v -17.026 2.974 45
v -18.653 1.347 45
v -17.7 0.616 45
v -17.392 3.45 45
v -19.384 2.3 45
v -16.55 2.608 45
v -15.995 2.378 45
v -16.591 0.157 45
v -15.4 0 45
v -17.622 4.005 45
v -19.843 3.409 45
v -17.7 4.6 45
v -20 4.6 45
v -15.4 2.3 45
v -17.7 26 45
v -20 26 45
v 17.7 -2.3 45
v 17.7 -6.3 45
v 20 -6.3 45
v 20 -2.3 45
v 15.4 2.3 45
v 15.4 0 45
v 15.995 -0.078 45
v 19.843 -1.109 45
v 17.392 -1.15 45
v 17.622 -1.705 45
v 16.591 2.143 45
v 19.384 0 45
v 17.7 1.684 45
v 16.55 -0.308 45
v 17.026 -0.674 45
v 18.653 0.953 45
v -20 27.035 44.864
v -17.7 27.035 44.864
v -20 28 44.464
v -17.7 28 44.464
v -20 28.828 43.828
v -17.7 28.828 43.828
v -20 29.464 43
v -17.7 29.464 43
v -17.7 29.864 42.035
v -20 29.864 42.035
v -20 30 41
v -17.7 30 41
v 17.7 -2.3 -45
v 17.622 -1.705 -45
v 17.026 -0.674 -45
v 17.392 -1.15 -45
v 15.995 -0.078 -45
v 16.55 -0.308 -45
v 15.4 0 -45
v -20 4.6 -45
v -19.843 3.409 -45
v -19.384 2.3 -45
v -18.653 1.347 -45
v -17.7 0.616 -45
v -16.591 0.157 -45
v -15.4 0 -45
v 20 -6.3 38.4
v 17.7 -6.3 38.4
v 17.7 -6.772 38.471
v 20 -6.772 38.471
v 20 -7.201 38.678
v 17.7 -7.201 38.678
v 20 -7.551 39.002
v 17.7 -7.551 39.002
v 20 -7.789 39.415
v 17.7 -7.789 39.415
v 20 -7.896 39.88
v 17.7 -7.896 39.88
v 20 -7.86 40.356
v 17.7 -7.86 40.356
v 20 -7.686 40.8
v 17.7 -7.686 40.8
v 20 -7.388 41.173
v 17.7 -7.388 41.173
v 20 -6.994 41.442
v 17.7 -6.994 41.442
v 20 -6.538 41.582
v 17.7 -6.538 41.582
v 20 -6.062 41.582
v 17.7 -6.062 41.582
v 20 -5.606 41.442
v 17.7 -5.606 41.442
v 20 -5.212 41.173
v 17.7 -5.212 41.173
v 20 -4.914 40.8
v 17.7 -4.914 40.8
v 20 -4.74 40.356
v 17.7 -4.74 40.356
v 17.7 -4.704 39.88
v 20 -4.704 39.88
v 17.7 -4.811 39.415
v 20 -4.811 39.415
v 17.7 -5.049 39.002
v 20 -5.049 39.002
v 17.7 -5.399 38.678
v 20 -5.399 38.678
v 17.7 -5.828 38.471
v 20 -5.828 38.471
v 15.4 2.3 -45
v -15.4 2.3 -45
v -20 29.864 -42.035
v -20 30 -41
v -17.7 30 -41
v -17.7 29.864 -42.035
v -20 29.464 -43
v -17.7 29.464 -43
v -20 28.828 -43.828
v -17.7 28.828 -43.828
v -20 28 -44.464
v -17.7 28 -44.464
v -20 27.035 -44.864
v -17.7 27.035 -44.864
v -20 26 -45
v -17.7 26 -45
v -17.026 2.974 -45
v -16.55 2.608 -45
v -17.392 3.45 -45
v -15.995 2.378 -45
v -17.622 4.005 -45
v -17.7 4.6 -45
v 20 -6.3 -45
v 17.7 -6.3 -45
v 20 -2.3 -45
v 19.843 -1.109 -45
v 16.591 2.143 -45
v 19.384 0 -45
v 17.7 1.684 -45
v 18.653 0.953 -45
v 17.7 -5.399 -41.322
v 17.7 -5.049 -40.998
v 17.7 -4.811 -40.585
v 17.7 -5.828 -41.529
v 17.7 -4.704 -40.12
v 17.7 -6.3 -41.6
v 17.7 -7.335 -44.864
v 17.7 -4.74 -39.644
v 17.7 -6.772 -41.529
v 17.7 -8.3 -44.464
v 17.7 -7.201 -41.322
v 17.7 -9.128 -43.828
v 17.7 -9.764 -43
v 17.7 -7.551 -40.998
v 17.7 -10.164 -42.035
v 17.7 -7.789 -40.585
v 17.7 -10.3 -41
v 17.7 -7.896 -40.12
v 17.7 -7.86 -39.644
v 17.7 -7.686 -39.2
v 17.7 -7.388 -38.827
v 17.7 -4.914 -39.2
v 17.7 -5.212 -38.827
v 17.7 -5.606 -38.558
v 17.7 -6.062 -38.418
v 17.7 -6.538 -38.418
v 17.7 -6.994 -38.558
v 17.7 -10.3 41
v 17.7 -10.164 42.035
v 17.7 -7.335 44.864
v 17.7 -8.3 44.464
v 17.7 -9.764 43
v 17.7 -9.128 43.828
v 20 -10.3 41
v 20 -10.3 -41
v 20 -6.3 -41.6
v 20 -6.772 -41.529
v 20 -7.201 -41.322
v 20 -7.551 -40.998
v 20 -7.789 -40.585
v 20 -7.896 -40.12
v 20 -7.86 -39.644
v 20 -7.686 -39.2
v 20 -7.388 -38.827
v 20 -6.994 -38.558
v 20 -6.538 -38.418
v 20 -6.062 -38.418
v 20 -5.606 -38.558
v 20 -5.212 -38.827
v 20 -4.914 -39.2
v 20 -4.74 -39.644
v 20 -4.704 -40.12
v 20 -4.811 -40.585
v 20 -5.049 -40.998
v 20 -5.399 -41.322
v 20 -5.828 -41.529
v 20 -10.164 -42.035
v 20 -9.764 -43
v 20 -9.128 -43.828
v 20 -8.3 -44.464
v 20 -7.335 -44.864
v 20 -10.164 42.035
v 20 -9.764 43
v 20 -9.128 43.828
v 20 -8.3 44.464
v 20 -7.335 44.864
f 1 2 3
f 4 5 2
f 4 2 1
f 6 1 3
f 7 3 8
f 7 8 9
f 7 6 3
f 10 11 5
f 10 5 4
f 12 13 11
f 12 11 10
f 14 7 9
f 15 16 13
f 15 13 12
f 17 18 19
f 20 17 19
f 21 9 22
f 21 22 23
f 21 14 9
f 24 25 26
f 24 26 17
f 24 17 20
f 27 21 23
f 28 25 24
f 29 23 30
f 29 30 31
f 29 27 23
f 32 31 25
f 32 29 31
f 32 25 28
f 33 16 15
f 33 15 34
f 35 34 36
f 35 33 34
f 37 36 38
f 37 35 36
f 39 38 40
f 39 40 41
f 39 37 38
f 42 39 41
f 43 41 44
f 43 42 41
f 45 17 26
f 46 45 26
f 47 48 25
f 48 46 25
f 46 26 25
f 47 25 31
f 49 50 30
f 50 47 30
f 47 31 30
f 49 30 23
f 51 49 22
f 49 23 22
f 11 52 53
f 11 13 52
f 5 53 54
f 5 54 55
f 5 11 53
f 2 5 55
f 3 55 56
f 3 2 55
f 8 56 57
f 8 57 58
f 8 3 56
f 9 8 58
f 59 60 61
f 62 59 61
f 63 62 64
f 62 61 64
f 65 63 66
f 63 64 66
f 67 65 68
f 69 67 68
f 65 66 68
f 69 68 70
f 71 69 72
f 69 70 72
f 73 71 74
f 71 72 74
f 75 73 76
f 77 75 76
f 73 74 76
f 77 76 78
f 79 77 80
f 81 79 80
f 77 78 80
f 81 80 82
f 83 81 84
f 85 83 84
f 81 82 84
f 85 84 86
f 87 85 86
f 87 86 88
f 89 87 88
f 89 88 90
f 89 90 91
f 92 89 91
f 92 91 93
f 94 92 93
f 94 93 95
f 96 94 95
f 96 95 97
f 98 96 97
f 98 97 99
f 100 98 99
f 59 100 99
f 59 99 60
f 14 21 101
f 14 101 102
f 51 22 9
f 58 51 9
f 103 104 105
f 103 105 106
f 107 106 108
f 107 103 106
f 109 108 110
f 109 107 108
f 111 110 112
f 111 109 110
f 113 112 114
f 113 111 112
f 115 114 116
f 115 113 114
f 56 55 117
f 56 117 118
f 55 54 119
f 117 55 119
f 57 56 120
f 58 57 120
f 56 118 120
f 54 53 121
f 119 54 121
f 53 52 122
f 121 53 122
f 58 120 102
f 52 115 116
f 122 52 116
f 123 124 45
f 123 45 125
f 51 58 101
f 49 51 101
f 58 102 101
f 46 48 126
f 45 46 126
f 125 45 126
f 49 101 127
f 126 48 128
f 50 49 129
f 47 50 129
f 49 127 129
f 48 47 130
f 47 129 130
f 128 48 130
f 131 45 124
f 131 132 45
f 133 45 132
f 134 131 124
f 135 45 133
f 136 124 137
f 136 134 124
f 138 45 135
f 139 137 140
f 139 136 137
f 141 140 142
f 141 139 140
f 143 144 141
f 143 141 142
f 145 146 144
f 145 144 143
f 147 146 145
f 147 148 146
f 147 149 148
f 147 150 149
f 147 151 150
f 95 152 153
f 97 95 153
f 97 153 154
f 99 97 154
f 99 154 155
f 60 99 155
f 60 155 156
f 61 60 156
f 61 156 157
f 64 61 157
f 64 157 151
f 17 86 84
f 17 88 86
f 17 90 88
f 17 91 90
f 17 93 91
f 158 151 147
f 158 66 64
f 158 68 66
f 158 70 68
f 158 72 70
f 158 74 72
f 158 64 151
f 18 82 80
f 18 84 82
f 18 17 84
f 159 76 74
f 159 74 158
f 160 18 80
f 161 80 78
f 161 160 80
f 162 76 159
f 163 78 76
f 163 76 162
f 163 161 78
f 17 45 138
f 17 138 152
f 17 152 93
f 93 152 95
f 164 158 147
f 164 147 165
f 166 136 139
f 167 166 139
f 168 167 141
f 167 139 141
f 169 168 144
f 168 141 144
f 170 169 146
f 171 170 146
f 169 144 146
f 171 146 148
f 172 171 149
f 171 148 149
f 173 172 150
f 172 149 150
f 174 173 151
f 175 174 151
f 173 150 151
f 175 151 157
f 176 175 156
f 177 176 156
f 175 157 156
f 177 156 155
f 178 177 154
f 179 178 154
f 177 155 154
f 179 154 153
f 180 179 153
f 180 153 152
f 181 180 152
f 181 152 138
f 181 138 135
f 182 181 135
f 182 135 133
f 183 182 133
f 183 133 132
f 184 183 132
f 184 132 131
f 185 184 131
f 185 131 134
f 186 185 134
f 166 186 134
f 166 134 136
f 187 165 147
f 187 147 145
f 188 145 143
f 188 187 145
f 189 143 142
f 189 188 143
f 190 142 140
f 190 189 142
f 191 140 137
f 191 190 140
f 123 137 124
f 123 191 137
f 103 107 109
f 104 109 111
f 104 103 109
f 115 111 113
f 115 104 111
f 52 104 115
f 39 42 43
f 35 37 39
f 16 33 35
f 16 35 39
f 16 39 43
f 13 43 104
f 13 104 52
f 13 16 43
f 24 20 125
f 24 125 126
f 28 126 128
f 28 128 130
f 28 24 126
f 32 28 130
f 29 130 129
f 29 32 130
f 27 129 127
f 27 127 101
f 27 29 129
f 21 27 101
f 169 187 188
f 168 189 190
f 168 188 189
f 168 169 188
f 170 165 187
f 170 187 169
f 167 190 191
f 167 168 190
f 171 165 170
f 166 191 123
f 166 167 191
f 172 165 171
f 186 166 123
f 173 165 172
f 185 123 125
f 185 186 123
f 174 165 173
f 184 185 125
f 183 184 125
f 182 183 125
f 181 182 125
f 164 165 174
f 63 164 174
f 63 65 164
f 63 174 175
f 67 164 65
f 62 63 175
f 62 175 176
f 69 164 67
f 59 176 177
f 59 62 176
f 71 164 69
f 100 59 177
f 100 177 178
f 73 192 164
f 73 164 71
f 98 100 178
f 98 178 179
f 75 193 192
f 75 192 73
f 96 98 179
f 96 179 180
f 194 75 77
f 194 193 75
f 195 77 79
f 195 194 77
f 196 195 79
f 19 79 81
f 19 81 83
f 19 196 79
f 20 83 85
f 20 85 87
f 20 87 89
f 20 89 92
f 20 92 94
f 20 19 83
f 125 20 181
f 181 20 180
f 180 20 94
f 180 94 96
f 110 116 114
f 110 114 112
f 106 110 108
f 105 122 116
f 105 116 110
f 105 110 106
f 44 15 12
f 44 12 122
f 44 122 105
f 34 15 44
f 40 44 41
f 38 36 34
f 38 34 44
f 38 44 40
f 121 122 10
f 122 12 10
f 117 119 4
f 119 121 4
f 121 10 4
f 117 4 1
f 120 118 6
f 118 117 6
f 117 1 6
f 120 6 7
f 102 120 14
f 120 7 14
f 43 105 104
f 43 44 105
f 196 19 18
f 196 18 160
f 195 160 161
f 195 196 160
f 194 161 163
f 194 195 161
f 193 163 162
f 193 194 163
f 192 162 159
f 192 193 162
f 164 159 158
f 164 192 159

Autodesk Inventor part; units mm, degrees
ref_plane "YZ Plane" through (0, 0, 0) normal (1, 0, 0) x (0, 1, 0)
ref_plane "XZ Plane" through (0, 0, 0) normal (0, 1, 0) x (-1, 0, 0)
ref_plane "XY Plane" through (0, 0, 0) normal (0, 0, 1) x (1, 0, 0)
sketch "スケッチ1" plane through (0, 0, 0) normal (0, 1, 0) x (-1, 0, 0)
  line L0 (-20, 45) -> (20, 45)
  line L1 (20, 45) -> (20, -45)
  line L2 (20, -45) -> (-20, -45)
  line L3 (-20, -45) -> (-20, 45)
  line L4 (-20, 45) -> (20, -45) construction
  line L5 (20, 45) -> (-20, -45) construction
  point P0 (0, 0)
  dimension "d0" = 90
  dimension "d1" = 40
extrude "プレート1" add sketch "スケッチ1" along normal blind 2.3
sketch "スケッチ2" plane through (17.7, 2.3, 45) normal (1, 0, 0) x (0, 1, 0)
  line L0 (0, -90) -> (0, 0)
  line L1 (0, 0) -> (-12.6, 0)
  line L2 (-12.6, 0) -> (-12.6, -90)
  line L3 (-12.6, -90) -> (0, -90)
edge flange "フランジ1" height 12.6 angle 90 thickness 2.3 bend radius 2.3 thickness toward (1, 0, 0) relief tear relief width 2.3 relief depth 1.15 edges at (20, 0, 0) wall of the first edge with corners at (17.7, 2.3, -45) (17.7, 2.3, 45) (17.7, -10.3, 45) (17.7, -10.3, -45)
bend "曲げ1"
corner "コーナー1"
sketch "スケッチ3" plane through (-17.7, 0, 45) normal (-1, 0, 0) x (0, -1, 0)
  line L0 (0, -90) -> (0, 0)
  line L1 (0, 0) -> (-30, 0)
  line L2 (-30, 0) -> (-30, -90)
  line L3 (-30, -90) -> (0, -90)
edge flange "フランジ2" height 30 angle 90 thickness 2.3 bend radius 2.3 thickness toward (-1, 0, 0) relief tear relief width 2.3 relief depth 1.15 edges at (-20, 2.3, 0) wall of the first edge with corners at (-17.7, 0, -45) (-17.7, 0, 45) (-17.7, 30, 45) (-17.7, 30, -45)
bend "曲げ2"
corner "コーナー2"
sketch "スケッチ4" plane through (20, -10.3, 45) normal (1, 0, 0) x (0, 0, -1)
  line L0 (90, 0) -> (0, 0) projected
  line L1 (0, 0) -> (0, 8) projected
  point P0 (45, 10.3)
  point P1 (5, 4)
  point P2 (85, 4)
  dimension "d23" = 4
  dimension "d24" = 80
  dimension "d25" = 5
hole "穴1" at (20, -6.3, 40) at (20, -6.3, -40) direction (-1, 0, 0) diameter 3.2 depth 2.3 tip angle 118 clearance for "Flat Head Machine Screw" size "M3" standard "Ansi Metric M Profile"
fillet "コーナーR1" radius 4 4 edges at (18.85, -10.3, 45) (18.85, -10.3, -45) (-18.85, 30, -45) (-18.85, 30, 45)
equation "\"d31\" = Thickness"
equation "\"d2\" = Thickness"
equation "\"d3\" = BendReliefWidth"
equation "\"d4\" = BendReliefDepth"
equation "\"d5\" = MinimumRemnant"
equation "\"d6\" = TransitionRadius"
equation "\"d9\" = BendRadius"
equation "\"d10\" = CornerReliefSize"
equation "\"d11\" = GapSize"
equation "\"d12\" = JacobiRadiusSize"
equation "\"d13\" = BendReliefWidth"
equation "\"d14\" = BendReliefDepth"
equation "\"d15\" = MinimumRemnant"
equation "\"d16\" = TransitionRadius"
equation "\"d19\" = BendRadius"
equation "\"d20\" = CornerReliefSize"
equation "\"d21\" = GapSize"
equation "\"d22\" = JacobiRadiusSize"
equation "\"BendRadius\" = Thickness"
equation "\"BendReliefWidth\" = Thickness"
equation "\"BendReliefDepth\" = 0.5 * Thickness"
equation "\"CornerReliefSize\" = 4 * Thickness"
equation "\"MinimumRemnant\" = 2 * Thickness"
equation "\"TransitionRadius\" = BendRadius"
equation "\"JacobiRadiusSize\" = BendRadius"
equation "\"GapSize\" = Thickness"
equation "\"Thickness\" = 2.3"
properties part number "plate7" material "鋼、炭素鋼"
